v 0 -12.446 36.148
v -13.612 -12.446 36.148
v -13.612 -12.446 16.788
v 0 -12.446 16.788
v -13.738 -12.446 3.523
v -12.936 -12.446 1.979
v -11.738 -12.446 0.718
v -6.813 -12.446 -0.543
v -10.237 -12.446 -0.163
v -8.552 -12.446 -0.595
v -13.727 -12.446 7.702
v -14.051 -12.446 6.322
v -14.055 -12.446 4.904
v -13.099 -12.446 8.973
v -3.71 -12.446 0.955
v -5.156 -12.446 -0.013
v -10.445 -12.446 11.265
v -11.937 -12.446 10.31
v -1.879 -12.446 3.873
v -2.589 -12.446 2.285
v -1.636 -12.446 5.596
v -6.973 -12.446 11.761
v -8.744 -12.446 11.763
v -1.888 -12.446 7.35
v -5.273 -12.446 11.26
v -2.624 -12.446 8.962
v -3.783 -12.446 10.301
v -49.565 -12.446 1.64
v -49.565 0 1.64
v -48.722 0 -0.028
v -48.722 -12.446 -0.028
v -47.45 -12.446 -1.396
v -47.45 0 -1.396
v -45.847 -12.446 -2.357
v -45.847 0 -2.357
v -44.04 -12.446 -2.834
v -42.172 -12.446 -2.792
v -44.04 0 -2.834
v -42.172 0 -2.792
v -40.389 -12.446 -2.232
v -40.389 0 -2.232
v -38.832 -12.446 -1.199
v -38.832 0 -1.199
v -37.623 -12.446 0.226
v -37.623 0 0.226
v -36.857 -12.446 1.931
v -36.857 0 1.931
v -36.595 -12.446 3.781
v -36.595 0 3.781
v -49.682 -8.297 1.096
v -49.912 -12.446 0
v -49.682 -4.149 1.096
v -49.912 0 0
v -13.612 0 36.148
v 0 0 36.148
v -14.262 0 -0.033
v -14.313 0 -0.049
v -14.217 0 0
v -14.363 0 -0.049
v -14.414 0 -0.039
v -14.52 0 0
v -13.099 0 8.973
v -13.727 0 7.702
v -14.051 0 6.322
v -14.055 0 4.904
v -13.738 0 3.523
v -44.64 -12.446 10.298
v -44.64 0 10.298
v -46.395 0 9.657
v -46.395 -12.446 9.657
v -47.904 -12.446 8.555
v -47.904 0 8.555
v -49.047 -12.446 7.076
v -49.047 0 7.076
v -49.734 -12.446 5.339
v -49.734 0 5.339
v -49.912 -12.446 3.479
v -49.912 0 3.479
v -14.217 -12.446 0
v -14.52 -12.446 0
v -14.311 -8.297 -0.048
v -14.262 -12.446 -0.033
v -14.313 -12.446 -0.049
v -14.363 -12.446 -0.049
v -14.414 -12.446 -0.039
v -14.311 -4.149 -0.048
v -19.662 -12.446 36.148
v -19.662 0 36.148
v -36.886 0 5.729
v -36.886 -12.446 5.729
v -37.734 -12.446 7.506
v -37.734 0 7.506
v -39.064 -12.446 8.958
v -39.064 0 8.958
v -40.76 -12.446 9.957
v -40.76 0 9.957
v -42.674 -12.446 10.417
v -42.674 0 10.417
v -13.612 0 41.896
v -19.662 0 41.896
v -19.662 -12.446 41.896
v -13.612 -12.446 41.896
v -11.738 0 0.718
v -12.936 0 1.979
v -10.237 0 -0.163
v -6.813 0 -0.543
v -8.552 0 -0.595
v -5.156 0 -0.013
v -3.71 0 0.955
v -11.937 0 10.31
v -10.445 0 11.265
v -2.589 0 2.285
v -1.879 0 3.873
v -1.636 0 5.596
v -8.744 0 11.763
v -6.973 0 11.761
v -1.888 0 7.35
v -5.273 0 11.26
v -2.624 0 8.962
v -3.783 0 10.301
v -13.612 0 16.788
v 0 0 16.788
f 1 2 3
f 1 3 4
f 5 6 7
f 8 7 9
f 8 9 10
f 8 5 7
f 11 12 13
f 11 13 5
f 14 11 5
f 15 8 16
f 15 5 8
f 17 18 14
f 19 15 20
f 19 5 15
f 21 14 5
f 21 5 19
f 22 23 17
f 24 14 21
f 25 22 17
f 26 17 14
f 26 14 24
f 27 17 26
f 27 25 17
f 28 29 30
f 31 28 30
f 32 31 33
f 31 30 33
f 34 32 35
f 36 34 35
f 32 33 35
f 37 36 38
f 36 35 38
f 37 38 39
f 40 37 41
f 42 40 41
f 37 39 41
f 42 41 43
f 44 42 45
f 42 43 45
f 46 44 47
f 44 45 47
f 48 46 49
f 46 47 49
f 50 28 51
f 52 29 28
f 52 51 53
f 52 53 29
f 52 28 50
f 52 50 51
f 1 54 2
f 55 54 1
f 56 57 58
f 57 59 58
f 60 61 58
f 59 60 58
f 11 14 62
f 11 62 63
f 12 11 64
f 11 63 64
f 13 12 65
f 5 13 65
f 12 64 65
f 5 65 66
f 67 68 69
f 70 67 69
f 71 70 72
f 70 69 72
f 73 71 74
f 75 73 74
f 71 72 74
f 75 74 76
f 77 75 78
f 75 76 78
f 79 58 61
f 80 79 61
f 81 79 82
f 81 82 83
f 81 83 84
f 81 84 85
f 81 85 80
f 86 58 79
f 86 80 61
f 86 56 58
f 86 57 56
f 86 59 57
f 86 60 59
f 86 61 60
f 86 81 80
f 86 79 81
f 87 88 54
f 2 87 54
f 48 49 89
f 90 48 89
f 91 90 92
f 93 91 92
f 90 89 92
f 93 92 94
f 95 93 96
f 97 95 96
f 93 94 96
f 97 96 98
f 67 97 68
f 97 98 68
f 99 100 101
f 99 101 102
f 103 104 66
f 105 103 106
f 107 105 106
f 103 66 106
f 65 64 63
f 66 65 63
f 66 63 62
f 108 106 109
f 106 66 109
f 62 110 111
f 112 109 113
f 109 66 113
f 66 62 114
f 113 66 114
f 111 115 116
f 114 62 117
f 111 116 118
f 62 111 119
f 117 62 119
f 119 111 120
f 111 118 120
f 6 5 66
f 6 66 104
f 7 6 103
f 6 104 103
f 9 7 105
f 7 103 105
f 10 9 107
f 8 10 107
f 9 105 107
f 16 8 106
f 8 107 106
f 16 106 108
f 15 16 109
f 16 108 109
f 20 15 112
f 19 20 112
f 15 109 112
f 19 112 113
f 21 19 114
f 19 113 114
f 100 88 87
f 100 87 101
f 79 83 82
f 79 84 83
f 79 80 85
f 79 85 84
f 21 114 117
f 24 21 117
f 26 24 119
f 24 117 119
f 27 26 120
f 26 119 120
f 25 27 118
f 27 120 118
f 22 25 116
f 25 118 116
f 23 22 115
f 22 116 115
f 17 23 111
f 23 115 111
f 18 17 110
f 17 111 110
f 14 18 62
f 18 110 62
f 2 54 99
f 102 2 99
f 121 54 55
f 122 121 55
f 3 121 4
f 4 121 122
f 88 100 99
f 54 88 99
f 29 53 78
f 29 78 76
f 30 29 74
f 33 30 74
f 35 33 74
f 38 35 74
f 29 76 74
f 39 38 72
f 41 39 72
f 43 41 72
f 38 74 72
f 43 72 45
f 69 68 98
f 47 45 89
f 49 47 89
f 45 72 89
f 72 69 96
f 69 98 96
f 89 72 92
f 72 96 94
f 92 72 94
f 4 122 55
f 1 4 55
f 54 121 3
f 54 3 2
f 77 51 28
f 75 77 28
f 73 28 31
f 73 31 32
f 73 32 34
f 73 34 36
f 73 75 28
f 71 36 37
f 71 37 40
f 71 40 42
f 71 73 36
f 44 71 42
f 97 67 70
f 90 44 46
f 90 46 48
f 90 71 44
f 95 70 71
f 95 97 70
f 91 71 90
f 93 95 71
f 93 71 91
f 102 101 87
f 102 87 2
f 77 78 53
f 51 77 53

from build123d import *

# Parameters (mm, degrees)
F1_DEPTH = 12.446
F0_W     = 6.0499049723
F0_H     = 5.7474076748
F0_W_2   = 13.612287119
F0_H_2   = 19.3596985191


with BuildPart() as f1:
    # F0 (on Front) → F1 (new body)
    with BuildSketch(Plane.XZ):
        with BuildLine():
            Line((-49.9117225409, 3.4786572239), (-49.9117225409, 0))
            add(Edge.make_bspline(
                [(-49.5652059441, 1.6402761529), (-49.6836660494, 1.09742076), (-49.7976942951, 0.54871038), (-49.9117225409, 0)],
                knots=[0.9495226435, 0.9495226435, 0.9495226435, 0.9495226435, 1, 1, 1, 1], degree=3))
            ThreePointArc((-49.5652059441, 1.6402761529), (-49.8033170935, 2.5472425692), (-49.9117225409, 3.4786572239))
        make_face()
        with BuildLine():
            ThreePointArc((-49.9117225409, 4.0837249228), (-49.918595638, 3.7811910734), (-49.9117225409, 3.4786572239))
            Line((-49.9117225409, 3.4786572239), (-49.9117225409, 4.0837249228))
        make_face()
        with BuildLine():
            Line((-49.9117225409, 4.0837249228), (-49.9117225409, 3.4786572239))
            ThreePointArc((-49.9117225409, 3.4786572239), (-49.8033170935, 2.5472425692), (-49.5652059441, 1.6402761529))
            add(Edge.make_bspline(
                [(-44.6397836083, 10.2978309733), (-45.119653972, 10.1041501862), (-47.8014157398, 8.582874138), (-48.8523363966, 4.9070728269), (-49.5652059441, 1.6402761529)],
                knots=[0.584004576, 0.584004576, 0.584004576, 0.584004576, 0.6457598692, 0.9495226435, 0.9495226435, 0.9495226435, 0.9495226435], degree=3))
            ThreePointArc((-44.6397836083, 10.2978309733), (-48.3367428118, 8.090903092), (-49.9117225409, 4.0837249228))
        make_face()
        with BuildLine():
            add(Edge.make_bspline(
                [(-44.6397836083, 10.2978309733), (-45.119653972, 10.1041501862), (-47.8014157398, 8.582874138), (-48.8523363966, 4.9070728269), (-49.5652059441, 1.6402761529)],
                knots=[0.584004576, 0.584004576, 0.584004576, 0.584004576, 0.6457598692, 0.9495226435, 0.9495226435, 0.9495226435, 0.9495226435], degree=3))
            ThreePointArc((-49.5652059441, 1.6402761529), (-42.171884192, -2.7916367166), (-36.5950577596, 3.7811910734))
            ThreePointArc((-36.5950577596, 3.7811910734), (-39.0636044286, 8.957681428), (-44.6397836083, 10.2978309733))
        make_face()
    extrude(amount=F1_DEPTH)


with BuildPart() as f1b:
    # F0 (on Front) → F1, piece 2 (new body)
    with BuildSketch(Plane.XZ):
        with Locations((-16.6372396052, 39.0218906105)):
            Rectangle(F0_W, F0_H)
    extrude(amount=F1_DEPTH)


with BuildPart() as f1c:
    # F0 (on Front) → F1, piece 3 (new body)
    with BuildSketch(Plane.XZ):
        with BuildLine():
            Line((-14.2172779888, 0), (-14.5197734237, 0))
            add(Edge.make_bspline(
                [(-14.2172779888, 0), (-14.3061968444, -0.0872909317), (-14.412985134, -0.0436454659), (-14.5197734237, 0)],
                knots=[0.952469801, 0.952469801, 0.952469801, 0.952469801, 1, 1, 1, 1], degree=3))
        make_face()
    extrude(amount=F1_DEPTH)


with BuildPart() as f1d:
    # F0 (on Front) → F1, piece 4 (new body)
    with BuildSketch(Plane.XZ):
        with Locations((-6.8061435595, 26.4683375135)):
            Rectangle(F0_W_2, F0_H_2)
    extrude(amount=F1_DEPTH)


with BuildPart() as f1e:
    # F0 (on Front) → F1, piece 5 (new body)
    with BuildSketch(Plane.XZ):
        with BuildLine():
            ThreePointArc((-13.0991596694, 8.9725089924), (-14.0512340104, 6.3217092663), (-13.7383403252, 3.5225518431))
            add(Edge.make_bspline(
                [(-13.0991596694, 8.9725089924), (-13.4021570242, 7.995667339), (-13.5891754167, 6.2309110491), (-13.6990528868, 4.2034320829), (-13.7383403252, 3.5225518431)],
                knots=[0.6405219867, 0.6405219867, 0.6405219867, 0.6405219867, 0.7474400174, 0.8053833563, 0.8053833563, 0.8053833563, 0.8053833563], degree=3))
        make_face()
        with BuildLine():
            add(Edge.make_bspline(
                [(-13.0991596694, 8.9725089924), (-13.4021570242, 7.995667339), (-13.5891754167, 6.2309110491), (-13.6990528868, 4.2034320829), (-13.7383403252, 3.5225518431)],
                knots=[0.6405219867, 0.6405219867, 0.6405219867, 0.6405219867, 0.7474400174, 0.8053833563, 0.8053833563, 0.8053833563, 0.8053833563], degree=3))
            ThreePointArc((-13.7383403252, 3.5225518431), (-6.8129623392, -0.5431301891), (-1.6361178808, 5.5961622857))
            ThreePointArc((-1.6361178808, 5.5961622857), (-6.1049974568, 11.5711318281), (-13.0991596694, 8.9725089924))
        make_face()
    extrude(amount=F1_DEPTH)


solid = Compound([f1.part, f1b.part, f1c.part, f1d.part, f1e.part])
